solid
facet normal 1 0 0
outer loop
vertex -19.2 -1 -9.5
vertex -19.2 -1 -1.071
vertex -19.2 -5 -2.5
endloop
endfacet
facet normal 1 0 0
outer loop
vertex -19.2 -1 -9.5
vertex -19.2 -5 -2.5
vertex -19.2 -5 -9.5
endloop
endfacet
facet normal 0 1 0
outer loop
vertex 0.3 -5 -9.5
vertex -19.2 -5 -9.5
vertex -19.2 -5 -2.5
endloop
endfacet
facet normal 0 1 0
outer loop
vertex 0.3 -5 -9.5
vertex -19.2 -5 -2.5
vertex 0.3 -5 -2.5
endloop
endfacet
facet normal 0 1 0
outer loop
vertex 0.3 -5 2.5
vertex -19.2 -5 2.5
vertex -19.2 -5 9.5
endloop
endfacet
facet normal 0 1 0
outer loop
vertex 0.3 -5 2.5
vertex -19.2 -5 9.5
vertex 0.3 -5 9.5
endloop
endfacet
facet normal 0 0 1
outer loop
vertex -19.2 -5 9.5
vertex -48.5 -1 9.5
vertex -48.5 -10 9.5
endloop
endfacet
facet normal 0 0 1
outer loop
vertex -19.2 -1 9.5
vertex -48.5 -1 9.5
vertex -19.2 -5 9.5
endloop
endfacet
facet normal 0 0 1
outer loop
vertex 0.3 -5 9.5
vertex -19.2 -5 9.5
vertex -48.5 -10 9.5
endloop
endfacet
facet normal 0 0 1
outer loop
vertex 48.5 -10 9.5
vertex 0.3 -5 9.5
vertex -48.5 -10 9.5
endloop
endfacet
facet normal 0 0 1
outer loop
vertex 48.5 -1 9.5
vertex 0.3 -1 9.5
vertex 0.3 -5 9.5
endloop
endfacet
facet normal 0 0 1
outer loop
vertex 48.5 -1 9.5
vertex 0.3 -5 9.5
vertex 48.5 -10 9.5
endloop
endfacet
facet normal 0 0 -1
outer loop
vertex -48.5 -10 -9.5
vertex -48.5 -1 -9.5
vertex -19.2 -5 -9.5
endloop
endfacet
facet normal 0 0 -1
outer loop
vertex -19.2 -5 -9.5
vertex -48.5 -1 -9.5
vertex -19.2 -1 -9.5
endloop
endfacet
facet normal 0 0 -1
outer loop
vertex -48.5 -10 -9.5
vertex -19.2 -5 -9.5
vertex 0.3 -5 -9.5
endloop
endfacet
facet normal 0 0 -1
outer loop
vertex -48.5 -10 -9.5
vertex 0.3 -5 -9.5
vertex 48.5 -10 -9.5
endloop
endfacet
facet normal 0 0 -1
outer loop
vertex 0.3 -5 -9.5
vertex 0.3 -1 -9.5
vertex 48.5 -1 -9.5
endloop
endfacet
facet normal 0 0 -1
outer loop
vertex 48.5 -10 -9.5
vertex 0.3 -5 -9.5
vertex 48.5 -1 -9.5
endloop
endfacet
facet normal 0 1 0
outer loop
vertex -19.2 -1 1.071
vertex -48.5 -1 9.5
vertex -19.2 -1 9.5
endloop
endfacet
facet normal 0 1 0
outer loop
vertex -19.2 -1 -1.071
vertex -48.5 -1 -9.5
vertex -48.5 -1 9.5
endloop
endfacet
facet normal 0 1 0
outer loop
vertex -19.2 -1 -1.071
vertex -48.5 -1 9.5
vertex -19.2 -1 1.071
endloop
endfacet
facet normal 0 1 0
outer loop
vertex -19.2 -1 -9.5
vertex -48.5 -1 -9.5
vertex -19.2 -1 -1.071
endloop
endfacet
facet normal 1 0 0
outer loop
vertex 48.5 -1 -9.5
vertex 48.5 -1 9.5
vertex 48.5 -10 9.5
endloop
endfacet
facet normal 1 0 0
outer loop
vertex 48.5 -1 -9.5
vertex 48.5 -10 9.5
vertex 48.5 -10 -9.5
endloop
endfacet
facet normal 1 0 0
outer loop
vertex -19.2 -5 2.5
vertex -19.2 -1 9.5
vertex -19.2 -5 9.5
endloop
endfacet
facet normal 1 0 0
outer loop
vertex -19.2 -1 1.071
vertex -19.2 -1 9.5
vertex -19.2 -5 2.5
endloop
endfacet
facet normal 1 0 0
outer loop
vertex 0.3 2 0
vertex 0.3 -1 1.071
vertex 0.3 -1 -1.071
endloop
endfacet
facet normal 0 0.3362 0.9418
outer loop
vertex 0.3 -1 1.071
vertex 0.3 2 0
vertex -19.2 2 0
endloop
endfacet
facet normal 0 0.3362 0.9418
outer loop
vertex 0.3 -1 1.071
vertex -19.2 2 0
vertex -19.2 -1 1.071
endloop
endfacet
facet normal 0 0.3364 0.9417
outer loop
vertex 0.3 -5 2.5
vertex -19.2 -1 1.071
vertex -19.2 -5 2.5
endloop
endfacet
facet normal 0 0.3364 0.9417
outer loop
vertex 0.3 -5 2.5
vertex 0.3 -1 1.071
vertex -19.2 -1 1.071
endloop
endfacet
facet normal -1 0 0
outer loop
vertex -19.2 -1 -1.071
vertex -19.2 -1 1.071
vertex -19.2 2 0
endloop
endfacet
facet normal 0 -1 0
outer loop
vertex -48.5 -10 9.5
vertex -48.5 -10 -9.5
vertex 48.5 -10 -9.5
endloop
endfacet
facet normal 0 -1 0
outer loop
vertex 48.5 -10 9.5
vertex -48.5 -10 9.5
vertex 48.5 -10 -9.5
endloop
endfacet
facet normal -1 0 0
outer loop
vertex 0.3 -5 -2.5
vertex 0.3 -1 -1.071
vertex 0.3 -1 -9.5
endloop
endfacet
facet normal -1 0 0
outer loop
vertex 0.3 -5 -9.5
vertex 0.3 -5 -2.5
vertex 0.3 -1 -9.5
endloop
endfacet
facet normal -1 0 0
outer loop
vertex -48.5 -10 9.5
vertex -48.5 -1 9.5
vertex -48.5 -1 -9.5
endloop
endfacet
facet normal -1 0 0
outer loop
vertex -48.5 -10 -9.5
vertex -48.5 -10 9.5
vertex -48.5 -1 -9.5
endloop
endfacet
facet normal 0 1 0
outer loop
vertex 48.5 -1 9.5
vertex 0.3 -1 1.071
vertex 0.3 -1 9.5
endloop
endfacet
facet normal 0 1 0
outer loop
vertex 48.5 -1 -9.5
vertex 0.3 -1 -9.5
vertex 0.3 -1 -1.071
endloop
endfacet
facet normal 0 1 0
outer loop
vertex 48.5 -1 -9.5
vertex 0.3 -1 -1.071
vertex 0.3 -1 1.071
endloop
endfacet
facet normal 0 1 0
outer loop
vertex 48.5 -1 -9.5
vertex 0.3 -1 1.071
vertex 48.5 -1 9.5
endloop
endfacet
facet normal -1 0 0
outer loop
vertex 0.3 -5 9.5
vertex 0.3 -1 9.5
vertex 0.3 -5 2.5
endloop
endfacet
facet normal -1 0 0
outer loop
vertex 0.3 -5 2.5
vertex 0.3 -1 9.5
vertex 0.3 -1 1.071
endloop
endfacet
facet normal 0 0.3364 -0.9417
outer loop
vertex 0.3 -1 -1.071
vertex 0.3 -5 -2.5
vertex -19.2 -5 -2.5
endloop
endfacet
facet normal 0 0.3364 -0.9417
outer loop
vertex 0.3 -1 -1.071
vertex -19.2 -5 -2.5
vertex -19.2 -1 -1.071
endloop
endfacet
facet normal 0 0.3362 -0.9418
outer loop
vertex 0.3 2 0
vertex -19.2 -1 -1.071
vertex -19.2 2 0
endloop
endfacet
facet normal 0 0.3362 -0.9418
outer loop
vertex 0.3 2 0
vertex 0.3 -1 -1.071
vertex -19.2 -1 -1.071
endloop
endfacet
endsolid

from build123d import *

# Parameters (mm, degrees)
SKETCH1_W                = 97
SKETCH1_H                = 19
BOSS_EXTRUDE1_DEPTH      = 10
SKETCH4_W                = 19.5
SKETCH4_H                = 19
CUT_EXTRUDE1_DEPTH       = 5
BOSS_EXTRUDE2_DEPTH      = 45.5
BOSS_EXTRUDE2_DEPTH_BACK = 29.5
SKETCH6_W                = 26.3
SKETCH6_H                = 19
SKETCH6_W_2              = 45.2
CUT_EXTRUDE2_DEPTH       = 2
SKETCH7_W                = 29.3
SKETCH7_H                = 19
SKETCH7_W_2              = 48.2
CUT_EXTRUDE3_DEPTH       = 1


with BuildPart() as part:
    # Sketch1 → Boss-Extrude1 (new body)
    with BuildSketch(Plane(origin=(0, 0, 0), x_dir=(1, 0, 0), z_dir=(0, 1, 0))):
        Rectangle(SKETCH1_W, SKETCH1_H)
    extrude(amount=-BOSS_EXTRUDE1_DEPTH)

    # Sketch4 → Cut-Extrude1 (cut)
    with BuildSketch(Plane(origin=(0, 0, 0), x_dir=(1, 0, 0), z_dir=(0, 1, 0))):
        with Locations((-9.45, 0)):
            Rectangle(SKETCH4_W, SKETCH4_H)
    extrude(amount=-CUT_EXTRUDE1_DEPTH, mode=Mode.SUBTRACT)

    # Sketch5 → Boss-Extrude2 (add, two sides: drawn at the far end of the back side and taken through both)
    with BuildSketch(Plane.ZY.offset(-0.3).offset(-BOSS_EXTRUDE2_DEPTH_BACK)):
        Polygon((-2.5, -5), (0, 2), (2.5, -5), align=None)
    extrude(amount=BOSS_EXTRUDE2_DEPTH + BOSS_EXTRUDE2_DEPTH_BACK)

    # Sketch6 → Cut-Extrude2 (cut)
    with BuildSketch(Plane(origin=(0, 0, 0), x_dir=(1, 0, 0), z_dir=(0, 1, 0))):
        with Locations((-32.35, 0)):
            Rectangle(SKETCH6_W, SKETCH6_H)
        with Locations((22.9, 0)):
            Rectangle(SKETCH6_W_2, SKETCH6_H)
    extrude(amount=CUT_EXTRUDE2_DEPTH, mode=Mode.SUBTRACT)

    # Sketch7 → Cut-Extrude3 (cut)
    with BuildSketch(Plane(origin=(0, 0, 0), x_dir=(1, 0, 0), z_dir=(0, 1, 0))):
        with Locations((-33.85, 0)):
            Rectangle(SKETCH7_W, SKETCH7_H)
        with Locations((24.4, 0)):
            Rectangle(SKETCH7_W_2, SKETCH7_H)
    extrude(amount=-CUT_EXTRUDE3_DEPTH, mode=Mode.SUBTRACT)


solid = part.part
